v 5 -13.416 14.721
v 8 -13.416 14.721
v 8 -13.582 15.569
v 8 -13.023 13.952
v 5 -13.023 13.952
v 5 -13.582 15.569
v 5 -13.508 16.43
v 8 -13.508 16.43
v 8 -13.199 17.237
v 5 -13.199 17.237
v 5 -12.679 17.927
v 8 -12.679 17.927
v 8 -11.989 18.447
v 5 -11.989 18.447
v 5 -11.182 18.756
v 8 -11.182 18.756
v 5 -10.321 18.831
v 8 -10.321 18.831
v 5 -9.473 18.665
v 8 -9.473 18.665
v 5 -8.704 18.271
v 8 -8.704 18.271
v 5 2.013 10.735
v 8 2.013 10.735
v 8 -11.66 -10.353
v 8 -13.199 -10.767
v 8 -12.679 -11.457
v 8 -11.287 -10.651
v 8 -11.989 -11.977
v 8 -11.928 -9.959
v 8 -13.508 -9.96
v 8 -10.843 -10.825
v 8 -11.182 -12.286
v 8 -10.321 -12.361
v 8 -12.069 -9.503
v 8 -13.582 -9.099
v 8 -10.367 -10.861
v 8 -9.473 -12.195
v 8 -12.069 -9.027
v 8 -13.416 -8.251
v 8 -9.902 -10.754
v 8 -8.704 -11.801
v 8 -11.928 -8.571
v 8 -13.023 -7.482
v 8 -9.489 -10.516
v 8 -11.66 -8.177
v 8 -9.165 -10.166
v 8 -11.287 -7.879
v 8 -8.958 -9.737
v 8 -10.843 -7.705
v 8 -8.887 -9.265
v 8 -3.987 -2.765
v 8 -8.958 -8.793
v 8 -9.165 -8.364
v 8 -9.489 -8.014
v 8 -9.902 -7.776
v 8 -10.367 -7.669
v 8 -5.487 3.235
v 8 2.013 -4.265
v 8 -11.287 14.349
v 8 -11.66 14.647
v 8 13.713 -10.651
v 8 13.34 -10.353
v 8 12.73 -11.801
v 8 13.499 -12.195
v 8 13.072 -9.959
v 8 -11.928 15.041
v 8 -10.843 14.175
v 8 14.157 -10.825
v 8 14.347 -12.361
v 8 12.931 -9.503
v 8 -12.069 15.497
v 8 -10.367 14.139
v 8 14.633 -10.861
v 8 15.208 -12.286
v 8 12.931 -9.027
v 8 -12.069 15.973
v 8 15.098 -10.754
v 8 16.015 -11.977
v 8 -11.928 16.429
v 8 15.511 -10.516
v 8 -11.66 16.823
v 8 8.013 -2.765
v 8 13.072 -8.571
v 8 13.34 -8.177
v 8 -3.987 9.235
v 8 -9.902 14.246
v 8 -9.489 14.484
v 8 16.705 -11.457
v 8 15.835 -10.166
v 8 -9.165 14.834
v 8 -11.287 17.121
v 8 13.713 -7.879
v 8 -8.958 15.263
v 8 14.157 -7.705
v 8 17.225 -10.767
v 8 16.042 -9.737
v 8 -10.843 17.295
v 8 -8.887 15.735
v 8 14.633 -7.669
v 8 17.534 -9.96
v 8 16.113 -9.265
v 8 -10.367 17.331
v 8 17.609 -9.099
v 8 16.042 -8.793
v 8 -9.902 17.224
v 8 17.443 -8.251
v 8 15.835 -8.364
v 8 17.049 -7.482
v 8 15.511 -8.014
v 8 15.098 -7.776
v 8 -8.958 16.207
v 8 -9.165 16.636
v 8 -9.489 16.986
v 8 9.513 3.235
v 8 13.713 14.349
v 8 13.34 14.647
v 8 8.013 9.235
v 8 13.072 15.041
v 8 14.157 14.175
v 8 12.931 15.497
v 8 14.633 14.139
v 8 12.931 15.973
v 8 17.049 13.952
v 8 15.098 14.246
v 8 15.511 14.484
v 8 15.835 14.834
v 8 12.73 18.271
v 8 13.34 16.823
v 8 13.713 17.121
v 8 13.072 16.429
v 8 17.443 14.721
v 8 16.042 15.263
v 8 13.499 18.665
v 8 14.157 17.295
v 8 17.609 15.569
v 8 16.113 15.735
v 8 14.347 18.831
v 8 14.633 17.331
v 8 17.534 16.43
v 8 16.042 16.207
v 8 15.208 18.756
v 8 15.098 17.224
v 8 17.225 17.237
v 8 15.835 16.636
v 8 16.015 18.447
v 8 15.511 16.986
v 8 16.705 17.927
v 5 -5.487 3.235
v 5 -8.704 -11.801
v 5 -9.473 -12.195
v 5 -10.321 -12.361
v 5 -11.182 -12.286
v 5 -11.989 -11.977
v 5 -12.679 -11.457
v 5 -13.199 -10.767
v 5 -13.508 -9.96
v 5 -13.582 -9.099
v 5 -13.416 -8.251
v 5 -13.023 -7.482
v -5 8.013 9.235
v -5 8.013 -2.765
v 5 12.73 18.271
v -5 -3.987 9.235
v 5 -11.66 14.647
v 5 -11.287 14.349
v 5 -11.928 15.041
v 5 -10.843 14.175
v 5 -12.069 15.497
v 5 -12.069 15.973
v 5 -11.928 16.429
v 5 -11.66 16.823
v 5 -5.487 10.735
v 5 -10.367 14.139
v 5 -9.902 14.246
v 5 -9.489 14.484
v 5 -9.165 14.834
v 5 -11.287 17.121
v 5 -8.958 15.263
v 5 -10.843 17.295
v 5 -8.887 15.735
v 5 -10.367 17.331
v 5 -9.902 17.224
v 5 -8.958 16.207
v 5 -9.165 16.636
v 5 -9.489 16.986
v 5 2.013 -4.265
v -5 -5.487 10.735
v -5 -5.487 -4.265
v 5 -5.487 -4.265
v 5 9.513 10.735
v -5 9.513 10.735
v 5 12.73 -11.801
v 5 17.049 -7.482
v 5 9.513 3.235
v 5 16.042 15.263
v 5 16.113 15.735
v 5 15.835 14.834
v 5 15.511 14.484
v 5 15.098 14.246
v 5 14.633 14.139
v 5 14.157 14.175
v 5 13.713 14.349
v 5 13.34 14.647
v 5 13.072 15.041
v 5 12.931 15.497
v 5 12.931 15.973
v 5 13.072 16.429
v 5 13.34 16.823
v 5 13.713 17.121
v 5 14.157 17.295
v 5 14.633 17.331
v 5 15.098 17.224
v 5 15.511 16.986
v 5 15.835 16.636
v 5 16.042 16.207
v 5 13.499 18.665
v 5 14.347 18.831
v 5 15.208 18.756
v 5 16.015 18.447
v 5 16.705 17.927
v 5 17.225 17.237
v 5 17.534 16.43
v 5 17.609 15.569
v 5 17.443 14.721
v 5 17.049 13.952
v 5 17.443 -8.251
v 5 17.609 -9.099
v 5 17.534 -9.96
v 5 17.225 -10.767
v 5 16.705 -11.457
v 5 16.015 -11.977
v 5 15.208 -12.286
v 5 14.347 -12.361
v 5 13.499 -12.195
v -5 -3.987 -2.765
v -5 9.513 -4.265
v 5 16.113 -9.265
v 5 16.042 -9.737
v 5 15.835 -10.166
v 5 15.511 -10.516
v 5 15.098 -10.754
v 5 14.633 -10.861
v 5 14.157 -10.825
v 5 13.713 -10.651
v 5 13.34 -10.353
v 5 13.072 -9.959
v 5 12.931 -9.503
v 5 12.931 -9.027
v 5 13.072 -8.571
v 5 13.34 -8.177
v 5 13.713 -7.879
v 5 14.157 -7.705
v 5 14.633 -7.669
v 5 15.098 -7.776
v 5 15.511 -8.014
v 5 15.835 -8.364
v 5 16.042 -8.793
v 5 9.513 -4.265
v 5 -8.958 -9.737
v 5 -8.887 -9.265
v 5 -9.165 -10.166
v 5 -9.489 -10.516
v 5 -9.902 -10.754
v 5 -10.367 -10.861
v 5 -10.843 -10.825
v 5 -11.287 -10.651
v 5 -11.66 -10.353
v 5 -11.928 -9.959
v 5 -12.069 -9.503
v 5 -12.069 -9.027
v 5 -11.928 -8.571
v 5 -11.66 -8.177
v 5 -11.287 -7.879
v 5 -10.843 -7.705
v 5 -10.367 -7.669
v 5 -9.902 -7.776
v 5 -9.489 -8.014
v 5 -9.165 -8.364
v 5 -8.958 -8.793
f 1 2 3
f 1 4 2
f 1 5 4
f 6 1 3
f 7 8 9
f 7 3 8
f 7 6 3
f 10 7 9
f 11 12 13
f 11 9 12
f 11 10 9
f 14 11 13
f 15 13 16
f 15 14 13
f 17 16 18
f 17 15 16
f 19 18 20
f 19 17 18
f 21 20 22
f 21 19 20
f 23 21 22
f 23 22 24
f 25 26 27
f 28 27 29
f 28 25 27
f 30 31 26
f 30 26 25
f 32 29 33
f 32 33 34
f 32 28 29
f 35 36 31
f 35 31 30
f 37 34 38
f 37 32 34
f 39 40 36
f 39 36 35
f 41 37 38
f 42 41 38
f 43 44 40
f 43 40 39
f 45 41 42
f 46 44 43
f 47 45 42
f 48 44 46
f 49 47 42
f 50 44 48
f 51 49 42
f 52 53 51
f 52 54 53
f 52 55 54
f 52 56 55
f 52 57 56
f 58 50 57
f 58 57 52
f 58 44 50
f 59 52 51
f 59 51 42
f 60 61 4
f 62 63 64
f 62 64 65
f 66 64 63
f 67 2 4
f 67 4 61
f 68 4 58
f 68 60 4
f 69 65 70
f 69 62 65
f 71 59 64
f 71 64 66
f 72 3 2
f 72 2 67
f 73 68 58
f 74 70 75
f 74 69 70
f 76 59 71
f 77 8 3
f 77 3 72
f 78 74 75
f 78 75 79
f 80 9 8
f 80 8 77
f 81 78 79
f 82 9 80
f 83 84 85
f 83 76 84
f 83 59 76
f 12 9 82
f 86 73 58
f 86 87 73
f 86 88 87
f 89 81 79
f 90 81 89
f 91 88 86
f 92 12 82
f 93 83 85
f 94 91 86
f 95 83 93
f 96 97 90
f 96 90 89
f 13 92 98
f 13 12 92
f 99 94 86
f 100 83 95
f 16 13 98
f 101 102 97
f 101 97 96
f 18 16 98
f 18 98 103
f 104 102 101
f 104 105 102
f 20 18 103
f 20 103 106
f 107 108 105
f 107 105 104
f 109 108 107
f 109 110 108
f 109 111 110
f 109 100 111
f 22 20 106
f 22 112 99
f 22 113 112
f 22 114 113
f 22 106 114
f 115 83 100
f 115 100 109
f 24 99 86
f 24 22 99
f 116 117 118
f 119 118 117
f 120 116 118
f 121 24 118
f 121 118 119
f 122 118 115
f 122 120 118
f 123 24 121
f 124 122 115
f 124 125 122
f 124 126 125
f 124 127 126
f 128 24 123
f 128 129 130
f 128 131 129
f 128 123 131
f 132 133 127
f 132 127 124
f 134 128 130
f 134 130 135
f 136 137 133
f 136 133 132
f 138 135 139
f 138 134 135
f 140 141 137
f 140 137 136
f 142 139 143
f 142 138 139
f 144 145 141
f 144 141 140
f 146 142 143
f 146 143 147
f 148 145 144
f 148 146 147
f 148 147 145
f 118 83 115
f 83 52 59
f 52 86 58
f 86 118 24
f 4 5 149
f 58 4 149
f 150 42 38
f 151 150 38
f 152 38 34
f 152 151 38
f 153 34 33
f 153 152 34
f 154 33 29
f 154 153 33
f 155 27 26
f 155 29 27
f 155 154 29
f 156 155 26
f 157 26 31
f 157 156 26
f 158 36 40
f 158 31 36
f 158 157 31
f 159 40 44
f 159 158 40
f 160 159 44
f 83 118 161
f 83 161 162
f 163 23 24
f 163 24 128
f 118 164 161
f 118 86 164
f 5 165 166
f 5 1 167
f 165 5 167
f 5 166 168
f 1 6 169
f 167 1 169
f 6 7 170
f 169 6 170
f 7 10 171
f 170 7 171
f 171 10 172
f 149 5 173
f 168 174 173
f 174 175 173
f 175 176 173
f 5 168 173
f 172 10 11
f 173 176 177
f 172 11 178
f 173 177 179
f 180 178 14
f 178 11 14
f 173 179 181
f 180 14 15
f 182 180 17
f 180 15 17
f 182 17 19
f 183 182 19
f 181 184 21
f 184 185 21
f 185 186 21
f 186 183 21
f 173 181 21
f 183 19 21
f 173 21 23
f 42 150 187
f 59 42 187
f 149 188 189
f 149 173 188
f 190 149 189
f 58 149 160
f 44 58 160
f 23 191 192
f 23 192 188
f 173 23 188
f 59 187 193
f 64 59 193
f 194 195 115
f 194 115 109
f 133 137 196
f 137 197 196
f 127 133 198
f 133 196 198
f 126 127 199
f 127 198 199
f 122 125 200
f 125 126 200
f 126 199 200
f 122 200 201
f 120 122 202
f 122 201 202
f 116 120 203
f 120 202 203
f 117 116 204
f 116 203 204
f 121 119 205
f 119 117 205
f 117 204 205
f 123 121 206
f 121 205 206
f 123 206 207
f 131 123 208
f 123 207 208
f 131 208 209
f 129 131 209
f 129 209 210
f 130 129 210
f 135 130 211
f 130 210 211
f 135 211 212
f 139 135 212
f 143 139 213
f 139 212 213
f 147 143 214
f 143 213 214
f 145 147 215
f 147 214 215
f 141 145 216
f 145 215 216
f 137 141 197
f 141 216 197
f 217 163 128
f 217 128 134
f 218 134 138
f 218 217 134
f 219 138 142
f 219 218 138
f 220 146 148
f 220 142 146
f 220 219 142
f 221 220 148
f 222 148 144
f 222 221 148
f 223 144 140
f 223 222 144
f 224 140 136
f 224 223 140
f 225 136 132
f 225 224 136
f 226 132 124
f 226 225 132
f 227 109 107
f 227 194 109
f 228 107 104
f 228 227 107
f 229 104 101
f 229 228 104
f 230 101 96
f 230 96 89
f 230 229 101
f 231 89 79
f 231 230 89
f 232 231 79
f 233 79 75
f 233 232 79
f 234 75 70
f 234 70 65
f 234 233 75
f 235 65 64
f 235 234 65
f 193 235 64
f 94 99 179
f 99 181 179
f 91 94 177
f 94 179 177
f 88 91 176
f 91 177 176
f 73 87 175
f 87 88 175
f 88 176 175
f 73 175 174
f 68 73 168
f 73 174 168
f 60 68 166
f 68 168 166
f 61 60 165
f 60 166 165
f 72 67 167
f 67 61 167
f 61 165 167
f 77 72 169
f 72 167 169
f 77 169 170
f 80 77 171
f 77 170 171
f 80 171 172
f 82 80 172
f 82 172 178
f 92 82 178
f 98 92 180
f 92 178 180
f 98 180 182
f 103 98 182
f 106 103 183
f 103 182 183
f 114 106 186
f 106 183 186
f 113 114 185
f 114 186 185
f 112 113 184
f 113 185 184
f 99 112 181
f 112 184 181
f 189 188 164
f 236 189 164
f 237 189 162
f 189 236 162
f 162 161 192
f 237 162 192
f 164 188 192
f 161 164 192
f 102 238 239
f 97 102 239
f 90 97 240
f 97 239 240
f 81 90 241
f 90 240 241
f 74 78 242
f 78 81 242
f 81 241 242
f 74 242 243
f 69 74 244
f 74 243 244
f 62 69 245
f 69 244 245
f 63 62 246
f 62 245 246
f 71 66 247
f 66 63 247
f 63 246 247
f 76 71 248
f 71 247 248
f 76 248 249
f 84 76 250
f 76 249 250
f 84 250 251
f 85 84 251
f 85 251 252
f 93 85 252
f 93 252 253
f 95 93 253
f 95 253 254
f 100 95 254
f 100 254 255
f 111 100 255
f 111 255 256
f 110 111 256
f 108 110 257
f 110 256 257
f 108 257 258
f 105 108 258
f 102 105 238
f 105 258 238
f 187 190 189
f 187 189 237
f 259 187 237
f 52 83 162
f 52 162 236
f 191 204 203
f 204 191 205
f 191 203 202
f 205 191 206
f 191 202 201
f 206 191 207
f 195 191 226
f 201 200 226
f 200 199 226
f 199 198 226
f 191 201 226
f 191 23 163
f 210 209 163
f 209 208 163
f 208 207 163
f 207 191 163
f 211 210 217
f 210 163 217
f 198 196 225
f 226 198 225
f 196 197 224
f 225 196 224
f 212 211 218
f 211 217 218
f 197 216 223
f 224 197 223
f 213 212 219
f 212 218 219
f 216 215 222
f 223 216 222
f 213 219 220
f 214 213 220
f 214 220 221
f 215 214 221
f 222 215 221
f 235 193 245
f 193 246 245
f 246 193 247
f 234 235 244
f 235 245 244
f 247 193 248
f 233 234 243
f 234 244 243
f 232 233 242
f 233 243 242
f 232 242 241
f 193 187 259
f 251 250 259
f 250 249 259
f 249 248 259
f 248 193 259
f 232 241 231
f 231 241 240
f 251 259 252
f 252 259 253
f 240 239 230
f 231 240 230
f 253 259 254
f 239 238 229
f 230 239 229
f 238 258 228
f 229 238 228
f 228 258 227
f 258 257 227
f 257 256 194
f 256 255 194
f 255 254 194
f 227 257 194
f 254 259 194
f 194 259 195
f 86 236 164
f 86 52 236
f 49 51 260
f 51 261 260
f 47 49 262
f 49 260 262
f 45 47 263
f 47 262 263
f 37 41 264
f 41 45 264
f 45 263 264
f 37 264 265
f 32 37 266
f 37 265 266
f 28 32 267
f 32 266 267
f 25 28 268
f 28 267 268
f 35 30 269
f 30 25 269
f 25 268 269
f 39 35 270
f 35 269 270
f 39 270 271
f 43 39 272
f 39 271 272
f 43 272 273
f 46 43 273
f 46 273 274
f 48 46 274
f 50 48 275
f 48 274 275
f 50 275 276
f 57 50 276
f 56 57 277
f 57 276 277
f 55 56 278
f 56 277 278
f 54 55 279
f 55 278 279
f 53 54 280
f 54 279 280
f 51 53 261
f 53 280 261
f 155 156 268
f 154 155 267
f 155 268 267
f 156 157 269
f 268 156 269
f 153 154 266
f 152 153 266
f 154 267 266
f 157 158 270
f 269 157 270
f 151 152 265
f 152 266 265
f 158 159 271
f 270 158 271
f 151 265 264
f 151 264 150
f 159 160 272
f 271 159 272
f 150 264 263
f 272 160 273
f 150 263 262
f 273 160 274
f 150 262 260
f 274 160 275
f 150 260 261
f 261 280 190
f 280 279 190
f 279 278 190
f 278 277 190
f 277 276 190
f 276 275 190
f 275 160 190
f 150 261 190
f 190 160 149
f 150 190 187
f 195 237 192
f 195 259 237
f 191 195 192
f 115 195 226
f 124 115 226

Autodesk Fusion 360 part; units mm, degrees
sketch "Sketch1" plane through (0, 0, 0) normal (1, 0, 0) x (0, 1, 0)
  line L0 (9.5131, 10.735) -> (-5.4869, 10.735)
  line L1 (-5.4869, 10.735) -> (-5.4869, -4.265)
  line L2 (-5.4869, -4.265) -> (9.5131, -4.265)
  line L3 (9.5131, -4.265) -> (9.5131, 10.735)
  line L4 (9.5131, 10.735) -> (-5.4869, -4.265) construction
  line L5 (-5.4869, 10.735) -> (9.5131, -4.265) construction
  line L6 (8.0131, -2.765) -> (-3.9869, -2.765)
  line L7 (-3.9869, -2.765) -> (-3.9869, 9.235)
  line L8 (-3.9869, 9.235) -> (8.0131, 9.235)
  line L9 (8.0131, 9.235) -> (8.0131, -2.765)
  line L10 (8.0131, -2.765) -> (-3.9869, 9.235) construction
  line L11 (-3.9869, -2.765) -> (8.0131, 9.235) construction
  point P0 (2.0131, 3.235)
  point P1 (2.0131, 3.235)
  dimension "d3" = 15
  dimension "d4" = 15
  dimension "d5" = 12
  dimension "d6" = 12
extrude "Extrude1" add sketch "Sketch1" along normal blind 5
sketch "Sketch2" plane through (5, 0, 0) normal (1, 0, 0) x (0, 1, 0)
  line L0 (-3.9869, 9.235) -> (8.0131, 9.235)
  line L1 (8.0131, 9.235) -> (8.0131, -2.765)
  line L2 (8.0131, -2.765) -> (-3.9869, -2.765)
  line L3 (-3.9869, -2.765) -> (-3.9869, 9.235)
  line L4 (9.5131, -4.265) -> (9.5131, 10.735)
  line L5 (9.5131, 10.735) -> (-5.4869, 10.735)
  line L6 (-5.4869, 10.735) -> (-5.4869, -4.265)
  line L7 (-5.4869, -4.265) -> (9.5131, -4.265)
  line L8 (17.0131, 18.235) -> (-12.9869, -11.765) construction
  line L9 (-12.9869, 18.235) -> (17.0131, -11.765) construction
  circle A0 centre (14.5131, 15.735) radius 1.6
  circle A1 centre (-10.4869, 15.735) radius 1.6
  circle A2 centre (-10.4869, -9.265) radius 1.6
  circle A3 centre (14.5131, -9.265) radius 1.6
  circle A4 centre (-10.4869, 15.735) radius 3.1
  circle A5 centre (14.5131, 15.735) radius 3.1
  circle A6 centre (-10.4869, -9.265) radius 3.1
  line L10 (9.5131, 10.735) -> (-5.4869, 10.735)
  line L11 (-5.4869, 10.735) -> (-5.4869, -4.265)
  line L12 (-5.4869, -4.265) -> (9.5131, -4.265)
  line L13 (9.5131, -4.265) -> (9.5131, 10.735)
  line L14 (9.5131, 10.735) -> (-5.4869, -4.265) construction
  line L15 (-5.4869, 10.735) -> (9.5131, -4.265) construction
  line L16 (-8.7038, 18.2708) -> (2.0131, 10.735)
  line L17 (2.0131, 10.735) -> (12.73, 18.2708)
  line L18 (-13.0227, 13.9519) -> (-5.4869, 3.235)
  line L19 (-5.4869, 3.235) -> (-13.0227, -7.4819)
  line L20 (-8.7038, -11.8008) -> (2.0131, -4.265)
  line L21 (9.5131, 3.235) -> (17.0489, 13.9519)
  circle A7 centre (14.5131, -9.265) radius 3.1
  line L22 (9.5131, 3.235) -> (17.0489, -7.4819)
  line L23 (2.0131, -4.265) -> (12.73, -11.8008)
  point P0 (2.0131, 3.235)
  point P1 (2.0131, 3.235)
  point P2 (2.0131, 3.235)
  dimension "d11" = 3.2
  dimension "d12" = 12.5
  dimension "d13" = 3.2
  dimension "d14" = 3.2
  dimension "d15" = 3.2
  dimension "d17" = 25
  dimension "d18" = 12.5
  dimension "d19" = 25
  dimension "d20" = 6.2
  dimension "d21" = 6.2
  dimension "d22" = 6.2
  dimension "d23" = 6.2
extrude "Extrude2" add sketch "Sketch2" along normal blind 3
extrude "Extrude4" add sketch "Sketch1" against normal blind 5
extrude "Extrude3" [suppressed]
equation "d11 = motorScrewHole"
equation "d13 = motorScrewHole"
equation "d14 = motorScrewHole"
equation "d15 = motorScrewHole"
equation "motorScrewHole = 3.2 mm" comment "poo"
equation "d20 = motorScrewHole + 3 mm"
equation "d21 = motorScrewHole + 3 mm"
equation "d22 = motorScrewHole + 3 mm"
equation "d23 = motorScrewHole + 3 mm"
